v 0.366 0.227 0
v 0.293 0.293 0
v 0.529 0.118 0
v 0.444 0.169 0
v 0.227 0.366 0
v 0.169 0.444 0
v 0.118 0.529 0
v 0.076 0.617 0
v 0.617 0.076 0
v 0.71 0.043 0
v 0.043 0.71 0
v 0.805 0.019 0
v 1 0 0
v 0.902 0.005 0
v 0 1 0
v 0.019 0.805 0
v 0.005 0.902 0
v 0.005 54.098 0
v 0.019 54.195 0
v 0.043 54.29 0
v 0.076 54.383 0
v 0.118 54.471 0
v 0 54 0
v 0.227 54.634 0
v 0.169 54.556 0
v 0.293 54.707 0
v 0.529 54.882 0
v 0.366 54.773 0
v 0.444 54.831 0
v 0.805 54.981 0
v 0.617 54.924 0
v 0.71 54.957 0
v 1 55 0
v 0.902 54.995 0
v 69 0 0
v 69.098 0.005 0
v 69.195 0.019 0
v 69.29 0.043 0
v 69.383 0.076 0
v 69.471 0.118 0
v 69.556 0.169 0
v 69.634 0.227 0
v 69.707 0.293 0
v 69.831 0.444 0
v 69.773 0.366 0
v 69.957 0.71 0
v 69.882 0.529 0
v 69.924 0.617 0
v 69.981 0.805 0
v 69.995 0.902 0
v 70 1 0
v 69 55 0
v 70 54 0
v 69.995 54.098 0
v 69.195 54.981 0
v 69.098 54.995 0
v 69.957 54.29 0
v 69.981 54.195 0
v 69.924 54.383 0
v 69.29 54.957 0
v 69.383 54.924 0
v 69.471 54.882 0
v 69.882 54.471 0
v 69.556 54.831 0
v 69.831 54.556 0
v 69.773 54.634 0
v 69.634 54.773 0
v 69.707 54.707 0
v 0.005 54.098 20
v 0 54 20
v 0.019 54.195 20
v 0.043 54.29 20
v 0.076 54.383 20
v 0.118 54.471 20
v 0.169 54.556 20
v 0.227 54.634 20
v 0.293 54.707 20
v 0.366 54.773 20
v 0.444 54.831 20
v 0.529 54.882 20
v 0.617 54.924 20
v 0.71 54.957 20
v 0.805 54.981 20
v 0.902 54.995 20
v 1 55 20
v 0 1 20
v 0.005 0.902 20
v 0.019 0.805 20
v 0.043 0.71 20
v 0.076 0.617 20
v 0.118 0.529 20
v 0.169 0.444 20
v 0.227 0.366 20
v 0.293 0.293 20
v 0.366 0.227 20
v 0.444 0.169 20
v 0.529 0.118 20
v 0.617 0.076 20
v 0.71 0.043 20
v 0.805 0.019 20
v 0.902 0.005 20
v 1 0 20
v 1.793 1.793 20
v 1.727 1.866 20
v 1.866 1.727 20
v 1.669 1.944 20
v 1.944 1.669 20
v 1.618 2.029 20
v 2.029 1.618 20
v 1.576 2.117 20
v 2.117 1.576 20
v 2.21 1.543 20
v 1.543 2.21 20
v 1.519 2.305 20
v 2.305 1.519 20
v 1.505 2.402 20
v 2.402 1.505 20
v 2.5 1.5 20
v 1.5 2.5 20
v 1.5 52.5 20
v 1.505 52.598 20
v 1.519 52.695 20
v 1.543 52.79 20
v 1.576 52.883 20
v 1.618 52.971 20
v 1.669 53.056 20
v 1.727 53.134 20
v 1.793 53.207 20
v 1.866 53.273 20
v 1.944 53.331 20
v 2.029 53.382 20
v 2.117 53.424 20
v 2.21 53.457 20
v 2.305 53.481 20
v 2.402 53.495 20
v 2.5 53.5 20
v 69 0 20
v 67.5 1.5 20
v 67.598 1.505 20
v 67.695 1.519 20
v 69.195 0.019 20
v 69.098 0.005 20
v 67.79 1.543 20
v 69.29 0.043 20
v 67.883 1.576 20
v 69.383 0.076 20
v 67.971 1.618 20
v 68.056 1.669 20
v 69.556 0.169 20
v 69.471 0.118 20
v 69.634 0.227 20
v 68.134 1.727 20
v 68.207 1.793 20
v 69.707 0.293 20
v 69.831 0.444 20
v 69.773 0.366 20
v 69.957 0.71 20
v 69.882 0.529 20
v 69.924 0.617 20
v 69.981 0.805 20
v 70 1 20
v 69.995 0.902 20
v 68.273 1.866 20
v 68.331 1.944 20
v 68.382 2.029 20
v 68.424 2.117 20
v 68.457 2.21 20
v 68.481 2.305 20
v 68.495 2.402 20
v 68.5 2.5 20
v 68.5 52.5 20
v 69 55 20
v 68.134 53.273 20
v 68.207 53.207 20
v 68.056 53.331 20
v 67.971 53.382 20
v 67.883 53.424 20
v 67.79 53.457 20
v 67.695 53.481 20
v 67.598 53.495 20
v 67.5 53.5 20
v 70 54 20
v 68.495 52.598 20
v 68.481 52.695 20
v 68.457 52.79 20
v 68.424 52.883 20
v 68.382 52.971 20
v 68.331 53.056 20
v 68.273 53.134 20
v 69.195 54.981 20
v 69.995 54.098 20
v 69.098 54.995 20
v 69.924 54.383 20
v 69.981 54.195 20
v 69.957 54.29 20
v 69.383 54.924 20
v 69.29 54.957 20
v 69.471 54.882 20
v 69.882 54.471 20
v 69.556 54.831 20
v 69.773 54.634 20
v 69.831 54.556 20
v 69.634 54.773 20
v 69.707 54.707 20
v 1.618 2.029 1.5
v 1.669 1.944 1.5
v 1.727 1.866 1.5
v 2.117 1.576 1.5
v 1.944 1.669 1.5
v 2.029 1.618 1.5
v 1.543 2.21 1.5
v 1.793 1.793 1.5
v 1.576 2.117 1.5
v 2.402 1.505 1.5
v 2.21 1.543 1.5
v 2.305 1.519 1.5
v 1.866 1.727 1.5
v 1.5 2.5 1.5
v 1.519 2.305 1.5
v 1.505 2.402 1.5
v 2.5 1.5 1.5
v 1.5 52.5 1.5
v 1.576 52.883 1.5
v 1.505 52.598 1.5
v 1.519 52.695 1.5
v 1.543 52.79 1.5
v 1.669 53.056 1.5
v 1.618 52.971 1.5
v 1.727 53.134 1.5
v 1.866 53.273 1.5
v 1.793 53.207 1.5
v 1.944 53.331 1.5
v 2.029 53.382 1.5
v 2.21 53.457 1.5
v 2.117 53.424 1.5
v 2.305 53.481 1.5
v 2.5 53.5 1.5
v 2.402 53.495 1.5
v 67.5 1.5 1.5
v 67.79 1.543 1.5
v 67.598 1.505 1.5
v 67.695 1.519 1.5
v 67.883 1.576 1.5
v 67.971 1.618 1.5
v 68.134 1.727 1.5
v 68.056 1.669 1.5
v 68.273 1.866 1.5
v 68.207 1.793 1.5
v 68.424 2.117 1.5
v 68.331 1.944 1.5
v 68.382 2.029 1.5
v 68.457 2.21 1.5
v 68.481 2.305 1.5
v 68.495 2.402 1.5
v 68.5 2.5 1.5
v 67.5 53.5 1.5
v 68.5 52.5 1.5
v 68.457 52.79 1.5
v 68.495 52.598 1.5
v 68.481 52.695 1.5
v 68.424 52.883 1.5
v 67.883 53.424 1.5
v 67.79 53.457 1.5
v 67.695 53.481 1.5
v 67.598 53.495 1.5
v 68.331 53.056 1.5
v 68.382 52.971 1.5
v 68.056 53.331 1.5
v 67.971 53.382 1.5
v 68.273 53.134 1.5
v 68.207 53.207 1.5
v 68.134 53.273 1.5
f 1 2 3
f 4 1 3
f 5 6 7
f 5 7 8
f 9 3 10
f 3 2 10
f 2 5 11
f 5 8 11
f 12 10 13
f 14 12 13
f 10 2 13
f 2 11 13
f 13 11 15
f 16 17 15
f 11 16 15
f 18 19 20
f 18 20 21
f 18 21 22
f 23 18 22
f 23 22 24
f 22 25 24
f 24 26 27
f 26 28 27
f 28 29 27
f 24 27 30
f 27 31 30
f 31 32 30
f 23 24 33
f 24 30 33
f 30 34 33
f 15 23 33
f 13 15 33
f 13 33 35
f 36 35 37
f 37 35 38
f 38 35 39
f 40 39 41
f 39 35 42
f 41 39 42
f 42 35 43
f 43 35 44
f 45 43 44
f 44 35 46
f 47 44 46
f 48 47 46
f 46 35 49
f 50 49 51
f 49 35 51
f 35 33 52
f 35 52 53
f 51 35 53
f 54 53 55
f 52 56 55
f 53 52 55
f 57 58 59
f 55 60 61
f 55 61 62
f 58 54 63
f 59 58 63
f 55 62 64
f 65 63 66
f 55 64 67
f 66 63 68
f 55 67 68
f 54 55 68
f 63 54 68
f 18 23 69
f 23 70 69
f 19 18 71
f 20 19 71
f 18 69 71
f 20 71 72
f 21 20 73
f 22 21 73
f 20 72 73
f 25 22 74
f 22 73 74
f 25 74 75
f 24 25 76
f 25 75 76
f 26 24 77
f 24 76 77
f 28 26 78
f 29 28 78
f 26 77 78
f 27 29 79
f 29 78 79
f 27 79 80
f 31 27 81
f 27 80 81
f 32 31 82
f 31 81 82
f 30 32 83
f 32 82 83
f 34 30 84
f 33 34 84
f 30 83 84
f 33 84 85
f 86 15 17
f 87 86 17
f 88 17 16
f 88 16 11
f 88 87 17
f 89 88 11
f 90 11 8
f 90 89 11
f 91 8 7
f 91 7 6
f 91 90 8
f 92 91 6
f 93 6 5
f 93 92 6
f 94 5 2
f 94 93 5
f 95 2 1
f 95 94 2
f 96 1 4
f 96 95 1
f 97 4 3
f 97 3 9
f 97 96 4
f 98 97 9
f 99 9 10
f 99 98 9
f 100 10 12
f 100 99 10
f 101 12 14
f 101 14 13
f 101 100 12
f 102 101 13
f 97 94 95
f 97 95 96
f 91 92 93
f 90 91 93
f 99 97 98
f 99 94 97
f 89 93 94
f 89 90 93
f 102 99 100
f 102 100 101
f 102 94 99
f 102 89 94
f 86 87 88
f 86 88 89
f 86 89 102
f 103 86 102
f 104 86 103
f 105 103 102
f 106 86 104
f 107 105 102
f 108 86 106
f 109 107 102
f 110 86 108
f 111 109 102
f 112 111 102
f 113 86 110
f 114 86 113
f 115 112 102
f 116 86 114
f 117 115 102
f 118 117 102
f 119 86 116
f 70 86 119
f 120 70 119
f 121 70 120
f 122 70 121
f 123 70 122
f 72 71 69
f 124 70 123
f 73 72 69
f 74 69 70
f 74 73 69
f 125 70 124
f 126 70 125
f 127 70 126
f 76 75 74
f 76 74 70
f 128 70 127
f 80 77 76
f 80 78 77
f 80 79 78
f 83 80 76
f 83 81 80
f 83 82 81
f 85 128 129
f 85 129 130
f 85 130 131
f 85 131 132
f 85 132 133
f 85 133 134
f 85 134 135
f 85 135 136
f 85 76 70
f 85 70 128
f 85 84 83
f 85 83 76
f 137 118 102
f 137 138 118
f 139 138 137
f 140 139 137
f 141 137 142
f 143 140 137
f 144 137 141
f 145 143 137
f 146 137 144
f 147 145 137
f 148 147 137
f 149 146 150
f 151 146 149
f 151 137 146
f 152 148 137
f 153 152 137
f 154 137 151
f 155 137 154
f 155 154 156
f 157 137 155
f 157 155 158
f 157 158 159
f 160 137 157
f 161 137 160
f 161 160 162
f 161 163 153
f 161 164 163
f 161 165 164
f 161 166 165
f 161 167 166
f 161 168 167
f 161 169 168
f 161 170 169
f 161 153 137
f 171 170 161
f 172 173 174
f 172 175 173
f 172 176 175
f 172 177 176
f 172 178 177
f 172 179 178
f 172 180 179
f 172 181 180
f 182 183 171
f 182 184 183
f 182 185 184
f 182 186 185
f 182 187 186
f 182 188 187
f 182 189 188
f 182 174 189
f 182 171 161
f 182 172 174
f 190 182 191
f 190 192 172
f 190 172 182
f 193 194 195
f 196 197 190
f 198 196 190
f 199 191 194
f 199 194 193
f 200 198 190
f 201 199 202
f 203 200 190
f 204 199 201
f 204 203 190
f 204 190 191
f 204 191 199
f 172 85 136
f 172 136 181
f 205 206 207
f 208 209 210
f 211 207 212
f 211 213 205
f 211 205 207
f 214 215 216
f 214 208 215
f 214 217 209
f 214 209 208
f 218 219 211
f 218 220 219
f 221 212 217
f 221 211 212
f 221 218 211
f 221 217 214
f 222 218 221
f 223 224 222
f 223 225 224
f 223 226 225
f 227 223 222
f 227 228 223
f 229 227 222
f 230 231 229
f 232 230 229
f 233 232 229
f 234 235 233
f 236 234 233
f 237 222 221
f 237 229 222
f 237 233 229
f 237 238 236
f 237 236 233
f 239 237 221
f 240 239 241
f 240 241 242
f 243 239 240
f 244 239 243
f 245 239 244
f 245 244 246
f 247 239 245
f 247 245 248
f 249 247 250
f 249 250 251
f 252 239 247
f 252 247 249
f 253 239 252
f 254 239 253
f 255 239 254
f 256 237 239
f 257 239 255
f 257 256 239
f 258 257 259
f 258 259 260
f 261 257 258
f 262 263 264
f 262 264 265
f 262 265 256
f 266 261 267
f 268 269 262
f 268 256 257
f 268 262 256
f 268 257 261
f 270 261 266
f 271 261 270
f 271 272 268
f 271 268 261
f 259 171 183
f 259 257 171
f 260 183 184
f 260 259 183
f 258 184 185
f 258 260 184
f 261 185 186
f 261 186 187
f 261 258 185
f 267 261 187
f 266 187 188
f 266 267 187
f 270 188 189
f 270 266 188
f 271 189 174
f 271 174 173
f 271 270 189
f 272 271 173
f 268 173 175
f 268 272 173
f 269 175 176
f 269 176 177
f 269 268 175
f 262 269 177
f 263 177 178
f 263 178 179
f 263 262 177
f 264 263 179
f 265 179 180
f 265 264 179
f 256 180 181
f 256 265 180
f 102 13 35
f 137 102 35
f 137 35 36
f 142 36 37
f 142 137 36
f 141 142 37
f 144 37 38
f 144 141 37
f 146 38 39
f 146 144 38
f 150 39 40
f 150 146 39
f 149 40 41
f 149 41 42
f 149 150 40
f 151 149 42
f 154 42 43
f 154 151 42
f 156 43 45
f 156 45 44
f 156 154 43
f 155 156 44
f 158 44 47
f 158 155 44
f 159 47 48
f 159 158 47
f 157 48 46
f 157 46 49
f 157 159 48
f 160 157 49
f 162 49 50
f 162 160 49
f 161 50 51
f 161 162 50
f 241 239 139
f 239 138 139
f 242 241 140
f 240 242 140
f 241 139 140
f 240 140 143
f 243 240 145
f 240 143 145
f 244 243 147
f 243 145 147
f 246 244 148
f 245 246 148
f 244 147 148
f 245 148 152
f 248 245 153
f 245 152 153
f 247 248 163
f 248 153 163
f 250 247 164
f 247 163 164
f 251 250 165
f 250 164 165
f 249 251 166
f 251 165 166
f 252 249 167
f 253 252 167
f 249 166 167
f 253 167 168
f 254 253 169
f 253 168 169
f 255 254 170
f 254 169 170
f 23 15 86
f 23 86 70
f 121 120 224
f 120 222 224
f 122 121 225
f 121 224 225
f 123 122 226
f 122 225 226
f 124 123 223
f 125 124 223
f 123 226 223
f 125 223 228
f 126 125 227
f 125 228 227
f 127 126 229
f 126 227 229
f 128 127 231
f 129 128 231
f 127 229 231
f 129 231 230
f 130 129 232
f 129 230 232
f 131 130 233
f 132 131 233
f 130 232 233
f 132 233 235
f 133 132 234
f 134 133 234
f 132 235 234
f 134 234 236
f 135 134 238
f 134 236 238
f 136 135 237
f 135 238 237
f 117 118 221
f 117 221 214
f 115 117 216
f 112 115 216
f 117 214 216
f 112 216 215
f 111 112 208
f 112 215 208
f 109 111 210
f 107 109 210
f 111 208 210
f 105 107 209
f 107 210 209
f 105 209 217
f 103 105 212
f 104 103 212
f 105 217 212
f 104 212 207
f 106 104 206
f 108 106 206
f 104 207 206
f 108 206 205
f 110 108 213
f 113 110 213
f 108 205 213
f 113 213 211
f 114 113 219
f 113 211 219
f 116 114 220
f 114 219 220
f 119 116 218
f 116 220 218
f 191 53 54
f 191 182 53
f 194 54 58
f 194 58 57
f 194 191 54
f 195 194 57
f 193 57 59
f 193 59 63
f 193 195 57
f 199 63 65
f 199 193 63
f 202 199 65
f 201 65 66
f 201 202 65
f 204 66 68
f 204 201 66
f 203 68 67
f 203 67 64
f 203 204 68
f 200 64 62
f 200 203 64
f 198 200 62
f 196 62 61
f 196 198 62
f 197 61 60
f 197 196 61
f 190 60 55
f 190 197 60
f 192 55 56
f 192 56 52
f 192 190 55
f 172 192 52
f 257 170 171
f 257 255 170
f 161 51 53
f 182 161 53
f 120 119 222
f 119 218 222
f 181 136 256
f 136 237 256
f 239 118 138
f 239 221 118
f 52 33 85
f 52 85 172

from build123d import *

# Parameters (mm, degrees)
F0_W     = 70
F0_H     = 55
F1_DEPTH = 20
F2_T     = -1.5
F3_R     = 1
F4_R     = 1
F5_R     = 1
F6_R     = 1
F7_R     = 1
F8_R     = 1
F9_R     = 1


with BuildPart() as f1:
    # F0 (on Top) → F1 (new body)
    with BuildSketch(Plane.XY):
        with Locations((35, 27.5)):
            Rectangle(F0_W, F0_H)
    extrude(amount=F1_DEPTH)

    # F2
    f2_openings = [f1.faces().sort_by_distance(p)[0] for p in [
        (35, 27.5, 20),
    ]]
    offset(amount=F2_T, openings=f2_openings)

    # F3
    f3_edges = [f1.edges().sort_by_distance(p)[0] for p in [
        (0, 55, 10),
        (1.5, 53.5, 10.75),
    ]]
    fillet(f3_edges, radius=F3_R)

    # F4
    f4_edges = [f1.edges().sort_by_distance(p)[0] for p in [
        (0, 0, 10),
    ]]
    fillet(f4_edges, radius=F4_R)

    # F5
    f5_edges = [f1.edges().sort_by_distance(p)[0] for p in [
        (70, 0, 10),
    ]]
    fillet(f5_edges, radius=F5_R)

    # F6
    f6_edges = [f1.edges().sort_by_distance(p)[0] for p in [
        (70, 55, 10),
    ]]
    fillet(f6_edges, radius=F6_R)

    # F7
    f7_edges = [f1.edges().sort_by_distance(p)[0] for p in [
        (68.5, 1.5, 10.75),
    ]]
    fillet(f7_edges, radius=F7_R)

    # F8
    f8_edges = [f1.edges().sort_by_distance(p)[0] for p in [
        (1.5, 1.5, 10.75),
    ]]
    fillet(f8_edges, radius=F8_R)

    # F9
    f9_edges = [f1.edges().sort_by_distance(p)[0] for p in [
        (68.5, 53.5, 10.75),
    ]]
    fillet(f9_edges, radius=F9_R)


solid = f1.part
